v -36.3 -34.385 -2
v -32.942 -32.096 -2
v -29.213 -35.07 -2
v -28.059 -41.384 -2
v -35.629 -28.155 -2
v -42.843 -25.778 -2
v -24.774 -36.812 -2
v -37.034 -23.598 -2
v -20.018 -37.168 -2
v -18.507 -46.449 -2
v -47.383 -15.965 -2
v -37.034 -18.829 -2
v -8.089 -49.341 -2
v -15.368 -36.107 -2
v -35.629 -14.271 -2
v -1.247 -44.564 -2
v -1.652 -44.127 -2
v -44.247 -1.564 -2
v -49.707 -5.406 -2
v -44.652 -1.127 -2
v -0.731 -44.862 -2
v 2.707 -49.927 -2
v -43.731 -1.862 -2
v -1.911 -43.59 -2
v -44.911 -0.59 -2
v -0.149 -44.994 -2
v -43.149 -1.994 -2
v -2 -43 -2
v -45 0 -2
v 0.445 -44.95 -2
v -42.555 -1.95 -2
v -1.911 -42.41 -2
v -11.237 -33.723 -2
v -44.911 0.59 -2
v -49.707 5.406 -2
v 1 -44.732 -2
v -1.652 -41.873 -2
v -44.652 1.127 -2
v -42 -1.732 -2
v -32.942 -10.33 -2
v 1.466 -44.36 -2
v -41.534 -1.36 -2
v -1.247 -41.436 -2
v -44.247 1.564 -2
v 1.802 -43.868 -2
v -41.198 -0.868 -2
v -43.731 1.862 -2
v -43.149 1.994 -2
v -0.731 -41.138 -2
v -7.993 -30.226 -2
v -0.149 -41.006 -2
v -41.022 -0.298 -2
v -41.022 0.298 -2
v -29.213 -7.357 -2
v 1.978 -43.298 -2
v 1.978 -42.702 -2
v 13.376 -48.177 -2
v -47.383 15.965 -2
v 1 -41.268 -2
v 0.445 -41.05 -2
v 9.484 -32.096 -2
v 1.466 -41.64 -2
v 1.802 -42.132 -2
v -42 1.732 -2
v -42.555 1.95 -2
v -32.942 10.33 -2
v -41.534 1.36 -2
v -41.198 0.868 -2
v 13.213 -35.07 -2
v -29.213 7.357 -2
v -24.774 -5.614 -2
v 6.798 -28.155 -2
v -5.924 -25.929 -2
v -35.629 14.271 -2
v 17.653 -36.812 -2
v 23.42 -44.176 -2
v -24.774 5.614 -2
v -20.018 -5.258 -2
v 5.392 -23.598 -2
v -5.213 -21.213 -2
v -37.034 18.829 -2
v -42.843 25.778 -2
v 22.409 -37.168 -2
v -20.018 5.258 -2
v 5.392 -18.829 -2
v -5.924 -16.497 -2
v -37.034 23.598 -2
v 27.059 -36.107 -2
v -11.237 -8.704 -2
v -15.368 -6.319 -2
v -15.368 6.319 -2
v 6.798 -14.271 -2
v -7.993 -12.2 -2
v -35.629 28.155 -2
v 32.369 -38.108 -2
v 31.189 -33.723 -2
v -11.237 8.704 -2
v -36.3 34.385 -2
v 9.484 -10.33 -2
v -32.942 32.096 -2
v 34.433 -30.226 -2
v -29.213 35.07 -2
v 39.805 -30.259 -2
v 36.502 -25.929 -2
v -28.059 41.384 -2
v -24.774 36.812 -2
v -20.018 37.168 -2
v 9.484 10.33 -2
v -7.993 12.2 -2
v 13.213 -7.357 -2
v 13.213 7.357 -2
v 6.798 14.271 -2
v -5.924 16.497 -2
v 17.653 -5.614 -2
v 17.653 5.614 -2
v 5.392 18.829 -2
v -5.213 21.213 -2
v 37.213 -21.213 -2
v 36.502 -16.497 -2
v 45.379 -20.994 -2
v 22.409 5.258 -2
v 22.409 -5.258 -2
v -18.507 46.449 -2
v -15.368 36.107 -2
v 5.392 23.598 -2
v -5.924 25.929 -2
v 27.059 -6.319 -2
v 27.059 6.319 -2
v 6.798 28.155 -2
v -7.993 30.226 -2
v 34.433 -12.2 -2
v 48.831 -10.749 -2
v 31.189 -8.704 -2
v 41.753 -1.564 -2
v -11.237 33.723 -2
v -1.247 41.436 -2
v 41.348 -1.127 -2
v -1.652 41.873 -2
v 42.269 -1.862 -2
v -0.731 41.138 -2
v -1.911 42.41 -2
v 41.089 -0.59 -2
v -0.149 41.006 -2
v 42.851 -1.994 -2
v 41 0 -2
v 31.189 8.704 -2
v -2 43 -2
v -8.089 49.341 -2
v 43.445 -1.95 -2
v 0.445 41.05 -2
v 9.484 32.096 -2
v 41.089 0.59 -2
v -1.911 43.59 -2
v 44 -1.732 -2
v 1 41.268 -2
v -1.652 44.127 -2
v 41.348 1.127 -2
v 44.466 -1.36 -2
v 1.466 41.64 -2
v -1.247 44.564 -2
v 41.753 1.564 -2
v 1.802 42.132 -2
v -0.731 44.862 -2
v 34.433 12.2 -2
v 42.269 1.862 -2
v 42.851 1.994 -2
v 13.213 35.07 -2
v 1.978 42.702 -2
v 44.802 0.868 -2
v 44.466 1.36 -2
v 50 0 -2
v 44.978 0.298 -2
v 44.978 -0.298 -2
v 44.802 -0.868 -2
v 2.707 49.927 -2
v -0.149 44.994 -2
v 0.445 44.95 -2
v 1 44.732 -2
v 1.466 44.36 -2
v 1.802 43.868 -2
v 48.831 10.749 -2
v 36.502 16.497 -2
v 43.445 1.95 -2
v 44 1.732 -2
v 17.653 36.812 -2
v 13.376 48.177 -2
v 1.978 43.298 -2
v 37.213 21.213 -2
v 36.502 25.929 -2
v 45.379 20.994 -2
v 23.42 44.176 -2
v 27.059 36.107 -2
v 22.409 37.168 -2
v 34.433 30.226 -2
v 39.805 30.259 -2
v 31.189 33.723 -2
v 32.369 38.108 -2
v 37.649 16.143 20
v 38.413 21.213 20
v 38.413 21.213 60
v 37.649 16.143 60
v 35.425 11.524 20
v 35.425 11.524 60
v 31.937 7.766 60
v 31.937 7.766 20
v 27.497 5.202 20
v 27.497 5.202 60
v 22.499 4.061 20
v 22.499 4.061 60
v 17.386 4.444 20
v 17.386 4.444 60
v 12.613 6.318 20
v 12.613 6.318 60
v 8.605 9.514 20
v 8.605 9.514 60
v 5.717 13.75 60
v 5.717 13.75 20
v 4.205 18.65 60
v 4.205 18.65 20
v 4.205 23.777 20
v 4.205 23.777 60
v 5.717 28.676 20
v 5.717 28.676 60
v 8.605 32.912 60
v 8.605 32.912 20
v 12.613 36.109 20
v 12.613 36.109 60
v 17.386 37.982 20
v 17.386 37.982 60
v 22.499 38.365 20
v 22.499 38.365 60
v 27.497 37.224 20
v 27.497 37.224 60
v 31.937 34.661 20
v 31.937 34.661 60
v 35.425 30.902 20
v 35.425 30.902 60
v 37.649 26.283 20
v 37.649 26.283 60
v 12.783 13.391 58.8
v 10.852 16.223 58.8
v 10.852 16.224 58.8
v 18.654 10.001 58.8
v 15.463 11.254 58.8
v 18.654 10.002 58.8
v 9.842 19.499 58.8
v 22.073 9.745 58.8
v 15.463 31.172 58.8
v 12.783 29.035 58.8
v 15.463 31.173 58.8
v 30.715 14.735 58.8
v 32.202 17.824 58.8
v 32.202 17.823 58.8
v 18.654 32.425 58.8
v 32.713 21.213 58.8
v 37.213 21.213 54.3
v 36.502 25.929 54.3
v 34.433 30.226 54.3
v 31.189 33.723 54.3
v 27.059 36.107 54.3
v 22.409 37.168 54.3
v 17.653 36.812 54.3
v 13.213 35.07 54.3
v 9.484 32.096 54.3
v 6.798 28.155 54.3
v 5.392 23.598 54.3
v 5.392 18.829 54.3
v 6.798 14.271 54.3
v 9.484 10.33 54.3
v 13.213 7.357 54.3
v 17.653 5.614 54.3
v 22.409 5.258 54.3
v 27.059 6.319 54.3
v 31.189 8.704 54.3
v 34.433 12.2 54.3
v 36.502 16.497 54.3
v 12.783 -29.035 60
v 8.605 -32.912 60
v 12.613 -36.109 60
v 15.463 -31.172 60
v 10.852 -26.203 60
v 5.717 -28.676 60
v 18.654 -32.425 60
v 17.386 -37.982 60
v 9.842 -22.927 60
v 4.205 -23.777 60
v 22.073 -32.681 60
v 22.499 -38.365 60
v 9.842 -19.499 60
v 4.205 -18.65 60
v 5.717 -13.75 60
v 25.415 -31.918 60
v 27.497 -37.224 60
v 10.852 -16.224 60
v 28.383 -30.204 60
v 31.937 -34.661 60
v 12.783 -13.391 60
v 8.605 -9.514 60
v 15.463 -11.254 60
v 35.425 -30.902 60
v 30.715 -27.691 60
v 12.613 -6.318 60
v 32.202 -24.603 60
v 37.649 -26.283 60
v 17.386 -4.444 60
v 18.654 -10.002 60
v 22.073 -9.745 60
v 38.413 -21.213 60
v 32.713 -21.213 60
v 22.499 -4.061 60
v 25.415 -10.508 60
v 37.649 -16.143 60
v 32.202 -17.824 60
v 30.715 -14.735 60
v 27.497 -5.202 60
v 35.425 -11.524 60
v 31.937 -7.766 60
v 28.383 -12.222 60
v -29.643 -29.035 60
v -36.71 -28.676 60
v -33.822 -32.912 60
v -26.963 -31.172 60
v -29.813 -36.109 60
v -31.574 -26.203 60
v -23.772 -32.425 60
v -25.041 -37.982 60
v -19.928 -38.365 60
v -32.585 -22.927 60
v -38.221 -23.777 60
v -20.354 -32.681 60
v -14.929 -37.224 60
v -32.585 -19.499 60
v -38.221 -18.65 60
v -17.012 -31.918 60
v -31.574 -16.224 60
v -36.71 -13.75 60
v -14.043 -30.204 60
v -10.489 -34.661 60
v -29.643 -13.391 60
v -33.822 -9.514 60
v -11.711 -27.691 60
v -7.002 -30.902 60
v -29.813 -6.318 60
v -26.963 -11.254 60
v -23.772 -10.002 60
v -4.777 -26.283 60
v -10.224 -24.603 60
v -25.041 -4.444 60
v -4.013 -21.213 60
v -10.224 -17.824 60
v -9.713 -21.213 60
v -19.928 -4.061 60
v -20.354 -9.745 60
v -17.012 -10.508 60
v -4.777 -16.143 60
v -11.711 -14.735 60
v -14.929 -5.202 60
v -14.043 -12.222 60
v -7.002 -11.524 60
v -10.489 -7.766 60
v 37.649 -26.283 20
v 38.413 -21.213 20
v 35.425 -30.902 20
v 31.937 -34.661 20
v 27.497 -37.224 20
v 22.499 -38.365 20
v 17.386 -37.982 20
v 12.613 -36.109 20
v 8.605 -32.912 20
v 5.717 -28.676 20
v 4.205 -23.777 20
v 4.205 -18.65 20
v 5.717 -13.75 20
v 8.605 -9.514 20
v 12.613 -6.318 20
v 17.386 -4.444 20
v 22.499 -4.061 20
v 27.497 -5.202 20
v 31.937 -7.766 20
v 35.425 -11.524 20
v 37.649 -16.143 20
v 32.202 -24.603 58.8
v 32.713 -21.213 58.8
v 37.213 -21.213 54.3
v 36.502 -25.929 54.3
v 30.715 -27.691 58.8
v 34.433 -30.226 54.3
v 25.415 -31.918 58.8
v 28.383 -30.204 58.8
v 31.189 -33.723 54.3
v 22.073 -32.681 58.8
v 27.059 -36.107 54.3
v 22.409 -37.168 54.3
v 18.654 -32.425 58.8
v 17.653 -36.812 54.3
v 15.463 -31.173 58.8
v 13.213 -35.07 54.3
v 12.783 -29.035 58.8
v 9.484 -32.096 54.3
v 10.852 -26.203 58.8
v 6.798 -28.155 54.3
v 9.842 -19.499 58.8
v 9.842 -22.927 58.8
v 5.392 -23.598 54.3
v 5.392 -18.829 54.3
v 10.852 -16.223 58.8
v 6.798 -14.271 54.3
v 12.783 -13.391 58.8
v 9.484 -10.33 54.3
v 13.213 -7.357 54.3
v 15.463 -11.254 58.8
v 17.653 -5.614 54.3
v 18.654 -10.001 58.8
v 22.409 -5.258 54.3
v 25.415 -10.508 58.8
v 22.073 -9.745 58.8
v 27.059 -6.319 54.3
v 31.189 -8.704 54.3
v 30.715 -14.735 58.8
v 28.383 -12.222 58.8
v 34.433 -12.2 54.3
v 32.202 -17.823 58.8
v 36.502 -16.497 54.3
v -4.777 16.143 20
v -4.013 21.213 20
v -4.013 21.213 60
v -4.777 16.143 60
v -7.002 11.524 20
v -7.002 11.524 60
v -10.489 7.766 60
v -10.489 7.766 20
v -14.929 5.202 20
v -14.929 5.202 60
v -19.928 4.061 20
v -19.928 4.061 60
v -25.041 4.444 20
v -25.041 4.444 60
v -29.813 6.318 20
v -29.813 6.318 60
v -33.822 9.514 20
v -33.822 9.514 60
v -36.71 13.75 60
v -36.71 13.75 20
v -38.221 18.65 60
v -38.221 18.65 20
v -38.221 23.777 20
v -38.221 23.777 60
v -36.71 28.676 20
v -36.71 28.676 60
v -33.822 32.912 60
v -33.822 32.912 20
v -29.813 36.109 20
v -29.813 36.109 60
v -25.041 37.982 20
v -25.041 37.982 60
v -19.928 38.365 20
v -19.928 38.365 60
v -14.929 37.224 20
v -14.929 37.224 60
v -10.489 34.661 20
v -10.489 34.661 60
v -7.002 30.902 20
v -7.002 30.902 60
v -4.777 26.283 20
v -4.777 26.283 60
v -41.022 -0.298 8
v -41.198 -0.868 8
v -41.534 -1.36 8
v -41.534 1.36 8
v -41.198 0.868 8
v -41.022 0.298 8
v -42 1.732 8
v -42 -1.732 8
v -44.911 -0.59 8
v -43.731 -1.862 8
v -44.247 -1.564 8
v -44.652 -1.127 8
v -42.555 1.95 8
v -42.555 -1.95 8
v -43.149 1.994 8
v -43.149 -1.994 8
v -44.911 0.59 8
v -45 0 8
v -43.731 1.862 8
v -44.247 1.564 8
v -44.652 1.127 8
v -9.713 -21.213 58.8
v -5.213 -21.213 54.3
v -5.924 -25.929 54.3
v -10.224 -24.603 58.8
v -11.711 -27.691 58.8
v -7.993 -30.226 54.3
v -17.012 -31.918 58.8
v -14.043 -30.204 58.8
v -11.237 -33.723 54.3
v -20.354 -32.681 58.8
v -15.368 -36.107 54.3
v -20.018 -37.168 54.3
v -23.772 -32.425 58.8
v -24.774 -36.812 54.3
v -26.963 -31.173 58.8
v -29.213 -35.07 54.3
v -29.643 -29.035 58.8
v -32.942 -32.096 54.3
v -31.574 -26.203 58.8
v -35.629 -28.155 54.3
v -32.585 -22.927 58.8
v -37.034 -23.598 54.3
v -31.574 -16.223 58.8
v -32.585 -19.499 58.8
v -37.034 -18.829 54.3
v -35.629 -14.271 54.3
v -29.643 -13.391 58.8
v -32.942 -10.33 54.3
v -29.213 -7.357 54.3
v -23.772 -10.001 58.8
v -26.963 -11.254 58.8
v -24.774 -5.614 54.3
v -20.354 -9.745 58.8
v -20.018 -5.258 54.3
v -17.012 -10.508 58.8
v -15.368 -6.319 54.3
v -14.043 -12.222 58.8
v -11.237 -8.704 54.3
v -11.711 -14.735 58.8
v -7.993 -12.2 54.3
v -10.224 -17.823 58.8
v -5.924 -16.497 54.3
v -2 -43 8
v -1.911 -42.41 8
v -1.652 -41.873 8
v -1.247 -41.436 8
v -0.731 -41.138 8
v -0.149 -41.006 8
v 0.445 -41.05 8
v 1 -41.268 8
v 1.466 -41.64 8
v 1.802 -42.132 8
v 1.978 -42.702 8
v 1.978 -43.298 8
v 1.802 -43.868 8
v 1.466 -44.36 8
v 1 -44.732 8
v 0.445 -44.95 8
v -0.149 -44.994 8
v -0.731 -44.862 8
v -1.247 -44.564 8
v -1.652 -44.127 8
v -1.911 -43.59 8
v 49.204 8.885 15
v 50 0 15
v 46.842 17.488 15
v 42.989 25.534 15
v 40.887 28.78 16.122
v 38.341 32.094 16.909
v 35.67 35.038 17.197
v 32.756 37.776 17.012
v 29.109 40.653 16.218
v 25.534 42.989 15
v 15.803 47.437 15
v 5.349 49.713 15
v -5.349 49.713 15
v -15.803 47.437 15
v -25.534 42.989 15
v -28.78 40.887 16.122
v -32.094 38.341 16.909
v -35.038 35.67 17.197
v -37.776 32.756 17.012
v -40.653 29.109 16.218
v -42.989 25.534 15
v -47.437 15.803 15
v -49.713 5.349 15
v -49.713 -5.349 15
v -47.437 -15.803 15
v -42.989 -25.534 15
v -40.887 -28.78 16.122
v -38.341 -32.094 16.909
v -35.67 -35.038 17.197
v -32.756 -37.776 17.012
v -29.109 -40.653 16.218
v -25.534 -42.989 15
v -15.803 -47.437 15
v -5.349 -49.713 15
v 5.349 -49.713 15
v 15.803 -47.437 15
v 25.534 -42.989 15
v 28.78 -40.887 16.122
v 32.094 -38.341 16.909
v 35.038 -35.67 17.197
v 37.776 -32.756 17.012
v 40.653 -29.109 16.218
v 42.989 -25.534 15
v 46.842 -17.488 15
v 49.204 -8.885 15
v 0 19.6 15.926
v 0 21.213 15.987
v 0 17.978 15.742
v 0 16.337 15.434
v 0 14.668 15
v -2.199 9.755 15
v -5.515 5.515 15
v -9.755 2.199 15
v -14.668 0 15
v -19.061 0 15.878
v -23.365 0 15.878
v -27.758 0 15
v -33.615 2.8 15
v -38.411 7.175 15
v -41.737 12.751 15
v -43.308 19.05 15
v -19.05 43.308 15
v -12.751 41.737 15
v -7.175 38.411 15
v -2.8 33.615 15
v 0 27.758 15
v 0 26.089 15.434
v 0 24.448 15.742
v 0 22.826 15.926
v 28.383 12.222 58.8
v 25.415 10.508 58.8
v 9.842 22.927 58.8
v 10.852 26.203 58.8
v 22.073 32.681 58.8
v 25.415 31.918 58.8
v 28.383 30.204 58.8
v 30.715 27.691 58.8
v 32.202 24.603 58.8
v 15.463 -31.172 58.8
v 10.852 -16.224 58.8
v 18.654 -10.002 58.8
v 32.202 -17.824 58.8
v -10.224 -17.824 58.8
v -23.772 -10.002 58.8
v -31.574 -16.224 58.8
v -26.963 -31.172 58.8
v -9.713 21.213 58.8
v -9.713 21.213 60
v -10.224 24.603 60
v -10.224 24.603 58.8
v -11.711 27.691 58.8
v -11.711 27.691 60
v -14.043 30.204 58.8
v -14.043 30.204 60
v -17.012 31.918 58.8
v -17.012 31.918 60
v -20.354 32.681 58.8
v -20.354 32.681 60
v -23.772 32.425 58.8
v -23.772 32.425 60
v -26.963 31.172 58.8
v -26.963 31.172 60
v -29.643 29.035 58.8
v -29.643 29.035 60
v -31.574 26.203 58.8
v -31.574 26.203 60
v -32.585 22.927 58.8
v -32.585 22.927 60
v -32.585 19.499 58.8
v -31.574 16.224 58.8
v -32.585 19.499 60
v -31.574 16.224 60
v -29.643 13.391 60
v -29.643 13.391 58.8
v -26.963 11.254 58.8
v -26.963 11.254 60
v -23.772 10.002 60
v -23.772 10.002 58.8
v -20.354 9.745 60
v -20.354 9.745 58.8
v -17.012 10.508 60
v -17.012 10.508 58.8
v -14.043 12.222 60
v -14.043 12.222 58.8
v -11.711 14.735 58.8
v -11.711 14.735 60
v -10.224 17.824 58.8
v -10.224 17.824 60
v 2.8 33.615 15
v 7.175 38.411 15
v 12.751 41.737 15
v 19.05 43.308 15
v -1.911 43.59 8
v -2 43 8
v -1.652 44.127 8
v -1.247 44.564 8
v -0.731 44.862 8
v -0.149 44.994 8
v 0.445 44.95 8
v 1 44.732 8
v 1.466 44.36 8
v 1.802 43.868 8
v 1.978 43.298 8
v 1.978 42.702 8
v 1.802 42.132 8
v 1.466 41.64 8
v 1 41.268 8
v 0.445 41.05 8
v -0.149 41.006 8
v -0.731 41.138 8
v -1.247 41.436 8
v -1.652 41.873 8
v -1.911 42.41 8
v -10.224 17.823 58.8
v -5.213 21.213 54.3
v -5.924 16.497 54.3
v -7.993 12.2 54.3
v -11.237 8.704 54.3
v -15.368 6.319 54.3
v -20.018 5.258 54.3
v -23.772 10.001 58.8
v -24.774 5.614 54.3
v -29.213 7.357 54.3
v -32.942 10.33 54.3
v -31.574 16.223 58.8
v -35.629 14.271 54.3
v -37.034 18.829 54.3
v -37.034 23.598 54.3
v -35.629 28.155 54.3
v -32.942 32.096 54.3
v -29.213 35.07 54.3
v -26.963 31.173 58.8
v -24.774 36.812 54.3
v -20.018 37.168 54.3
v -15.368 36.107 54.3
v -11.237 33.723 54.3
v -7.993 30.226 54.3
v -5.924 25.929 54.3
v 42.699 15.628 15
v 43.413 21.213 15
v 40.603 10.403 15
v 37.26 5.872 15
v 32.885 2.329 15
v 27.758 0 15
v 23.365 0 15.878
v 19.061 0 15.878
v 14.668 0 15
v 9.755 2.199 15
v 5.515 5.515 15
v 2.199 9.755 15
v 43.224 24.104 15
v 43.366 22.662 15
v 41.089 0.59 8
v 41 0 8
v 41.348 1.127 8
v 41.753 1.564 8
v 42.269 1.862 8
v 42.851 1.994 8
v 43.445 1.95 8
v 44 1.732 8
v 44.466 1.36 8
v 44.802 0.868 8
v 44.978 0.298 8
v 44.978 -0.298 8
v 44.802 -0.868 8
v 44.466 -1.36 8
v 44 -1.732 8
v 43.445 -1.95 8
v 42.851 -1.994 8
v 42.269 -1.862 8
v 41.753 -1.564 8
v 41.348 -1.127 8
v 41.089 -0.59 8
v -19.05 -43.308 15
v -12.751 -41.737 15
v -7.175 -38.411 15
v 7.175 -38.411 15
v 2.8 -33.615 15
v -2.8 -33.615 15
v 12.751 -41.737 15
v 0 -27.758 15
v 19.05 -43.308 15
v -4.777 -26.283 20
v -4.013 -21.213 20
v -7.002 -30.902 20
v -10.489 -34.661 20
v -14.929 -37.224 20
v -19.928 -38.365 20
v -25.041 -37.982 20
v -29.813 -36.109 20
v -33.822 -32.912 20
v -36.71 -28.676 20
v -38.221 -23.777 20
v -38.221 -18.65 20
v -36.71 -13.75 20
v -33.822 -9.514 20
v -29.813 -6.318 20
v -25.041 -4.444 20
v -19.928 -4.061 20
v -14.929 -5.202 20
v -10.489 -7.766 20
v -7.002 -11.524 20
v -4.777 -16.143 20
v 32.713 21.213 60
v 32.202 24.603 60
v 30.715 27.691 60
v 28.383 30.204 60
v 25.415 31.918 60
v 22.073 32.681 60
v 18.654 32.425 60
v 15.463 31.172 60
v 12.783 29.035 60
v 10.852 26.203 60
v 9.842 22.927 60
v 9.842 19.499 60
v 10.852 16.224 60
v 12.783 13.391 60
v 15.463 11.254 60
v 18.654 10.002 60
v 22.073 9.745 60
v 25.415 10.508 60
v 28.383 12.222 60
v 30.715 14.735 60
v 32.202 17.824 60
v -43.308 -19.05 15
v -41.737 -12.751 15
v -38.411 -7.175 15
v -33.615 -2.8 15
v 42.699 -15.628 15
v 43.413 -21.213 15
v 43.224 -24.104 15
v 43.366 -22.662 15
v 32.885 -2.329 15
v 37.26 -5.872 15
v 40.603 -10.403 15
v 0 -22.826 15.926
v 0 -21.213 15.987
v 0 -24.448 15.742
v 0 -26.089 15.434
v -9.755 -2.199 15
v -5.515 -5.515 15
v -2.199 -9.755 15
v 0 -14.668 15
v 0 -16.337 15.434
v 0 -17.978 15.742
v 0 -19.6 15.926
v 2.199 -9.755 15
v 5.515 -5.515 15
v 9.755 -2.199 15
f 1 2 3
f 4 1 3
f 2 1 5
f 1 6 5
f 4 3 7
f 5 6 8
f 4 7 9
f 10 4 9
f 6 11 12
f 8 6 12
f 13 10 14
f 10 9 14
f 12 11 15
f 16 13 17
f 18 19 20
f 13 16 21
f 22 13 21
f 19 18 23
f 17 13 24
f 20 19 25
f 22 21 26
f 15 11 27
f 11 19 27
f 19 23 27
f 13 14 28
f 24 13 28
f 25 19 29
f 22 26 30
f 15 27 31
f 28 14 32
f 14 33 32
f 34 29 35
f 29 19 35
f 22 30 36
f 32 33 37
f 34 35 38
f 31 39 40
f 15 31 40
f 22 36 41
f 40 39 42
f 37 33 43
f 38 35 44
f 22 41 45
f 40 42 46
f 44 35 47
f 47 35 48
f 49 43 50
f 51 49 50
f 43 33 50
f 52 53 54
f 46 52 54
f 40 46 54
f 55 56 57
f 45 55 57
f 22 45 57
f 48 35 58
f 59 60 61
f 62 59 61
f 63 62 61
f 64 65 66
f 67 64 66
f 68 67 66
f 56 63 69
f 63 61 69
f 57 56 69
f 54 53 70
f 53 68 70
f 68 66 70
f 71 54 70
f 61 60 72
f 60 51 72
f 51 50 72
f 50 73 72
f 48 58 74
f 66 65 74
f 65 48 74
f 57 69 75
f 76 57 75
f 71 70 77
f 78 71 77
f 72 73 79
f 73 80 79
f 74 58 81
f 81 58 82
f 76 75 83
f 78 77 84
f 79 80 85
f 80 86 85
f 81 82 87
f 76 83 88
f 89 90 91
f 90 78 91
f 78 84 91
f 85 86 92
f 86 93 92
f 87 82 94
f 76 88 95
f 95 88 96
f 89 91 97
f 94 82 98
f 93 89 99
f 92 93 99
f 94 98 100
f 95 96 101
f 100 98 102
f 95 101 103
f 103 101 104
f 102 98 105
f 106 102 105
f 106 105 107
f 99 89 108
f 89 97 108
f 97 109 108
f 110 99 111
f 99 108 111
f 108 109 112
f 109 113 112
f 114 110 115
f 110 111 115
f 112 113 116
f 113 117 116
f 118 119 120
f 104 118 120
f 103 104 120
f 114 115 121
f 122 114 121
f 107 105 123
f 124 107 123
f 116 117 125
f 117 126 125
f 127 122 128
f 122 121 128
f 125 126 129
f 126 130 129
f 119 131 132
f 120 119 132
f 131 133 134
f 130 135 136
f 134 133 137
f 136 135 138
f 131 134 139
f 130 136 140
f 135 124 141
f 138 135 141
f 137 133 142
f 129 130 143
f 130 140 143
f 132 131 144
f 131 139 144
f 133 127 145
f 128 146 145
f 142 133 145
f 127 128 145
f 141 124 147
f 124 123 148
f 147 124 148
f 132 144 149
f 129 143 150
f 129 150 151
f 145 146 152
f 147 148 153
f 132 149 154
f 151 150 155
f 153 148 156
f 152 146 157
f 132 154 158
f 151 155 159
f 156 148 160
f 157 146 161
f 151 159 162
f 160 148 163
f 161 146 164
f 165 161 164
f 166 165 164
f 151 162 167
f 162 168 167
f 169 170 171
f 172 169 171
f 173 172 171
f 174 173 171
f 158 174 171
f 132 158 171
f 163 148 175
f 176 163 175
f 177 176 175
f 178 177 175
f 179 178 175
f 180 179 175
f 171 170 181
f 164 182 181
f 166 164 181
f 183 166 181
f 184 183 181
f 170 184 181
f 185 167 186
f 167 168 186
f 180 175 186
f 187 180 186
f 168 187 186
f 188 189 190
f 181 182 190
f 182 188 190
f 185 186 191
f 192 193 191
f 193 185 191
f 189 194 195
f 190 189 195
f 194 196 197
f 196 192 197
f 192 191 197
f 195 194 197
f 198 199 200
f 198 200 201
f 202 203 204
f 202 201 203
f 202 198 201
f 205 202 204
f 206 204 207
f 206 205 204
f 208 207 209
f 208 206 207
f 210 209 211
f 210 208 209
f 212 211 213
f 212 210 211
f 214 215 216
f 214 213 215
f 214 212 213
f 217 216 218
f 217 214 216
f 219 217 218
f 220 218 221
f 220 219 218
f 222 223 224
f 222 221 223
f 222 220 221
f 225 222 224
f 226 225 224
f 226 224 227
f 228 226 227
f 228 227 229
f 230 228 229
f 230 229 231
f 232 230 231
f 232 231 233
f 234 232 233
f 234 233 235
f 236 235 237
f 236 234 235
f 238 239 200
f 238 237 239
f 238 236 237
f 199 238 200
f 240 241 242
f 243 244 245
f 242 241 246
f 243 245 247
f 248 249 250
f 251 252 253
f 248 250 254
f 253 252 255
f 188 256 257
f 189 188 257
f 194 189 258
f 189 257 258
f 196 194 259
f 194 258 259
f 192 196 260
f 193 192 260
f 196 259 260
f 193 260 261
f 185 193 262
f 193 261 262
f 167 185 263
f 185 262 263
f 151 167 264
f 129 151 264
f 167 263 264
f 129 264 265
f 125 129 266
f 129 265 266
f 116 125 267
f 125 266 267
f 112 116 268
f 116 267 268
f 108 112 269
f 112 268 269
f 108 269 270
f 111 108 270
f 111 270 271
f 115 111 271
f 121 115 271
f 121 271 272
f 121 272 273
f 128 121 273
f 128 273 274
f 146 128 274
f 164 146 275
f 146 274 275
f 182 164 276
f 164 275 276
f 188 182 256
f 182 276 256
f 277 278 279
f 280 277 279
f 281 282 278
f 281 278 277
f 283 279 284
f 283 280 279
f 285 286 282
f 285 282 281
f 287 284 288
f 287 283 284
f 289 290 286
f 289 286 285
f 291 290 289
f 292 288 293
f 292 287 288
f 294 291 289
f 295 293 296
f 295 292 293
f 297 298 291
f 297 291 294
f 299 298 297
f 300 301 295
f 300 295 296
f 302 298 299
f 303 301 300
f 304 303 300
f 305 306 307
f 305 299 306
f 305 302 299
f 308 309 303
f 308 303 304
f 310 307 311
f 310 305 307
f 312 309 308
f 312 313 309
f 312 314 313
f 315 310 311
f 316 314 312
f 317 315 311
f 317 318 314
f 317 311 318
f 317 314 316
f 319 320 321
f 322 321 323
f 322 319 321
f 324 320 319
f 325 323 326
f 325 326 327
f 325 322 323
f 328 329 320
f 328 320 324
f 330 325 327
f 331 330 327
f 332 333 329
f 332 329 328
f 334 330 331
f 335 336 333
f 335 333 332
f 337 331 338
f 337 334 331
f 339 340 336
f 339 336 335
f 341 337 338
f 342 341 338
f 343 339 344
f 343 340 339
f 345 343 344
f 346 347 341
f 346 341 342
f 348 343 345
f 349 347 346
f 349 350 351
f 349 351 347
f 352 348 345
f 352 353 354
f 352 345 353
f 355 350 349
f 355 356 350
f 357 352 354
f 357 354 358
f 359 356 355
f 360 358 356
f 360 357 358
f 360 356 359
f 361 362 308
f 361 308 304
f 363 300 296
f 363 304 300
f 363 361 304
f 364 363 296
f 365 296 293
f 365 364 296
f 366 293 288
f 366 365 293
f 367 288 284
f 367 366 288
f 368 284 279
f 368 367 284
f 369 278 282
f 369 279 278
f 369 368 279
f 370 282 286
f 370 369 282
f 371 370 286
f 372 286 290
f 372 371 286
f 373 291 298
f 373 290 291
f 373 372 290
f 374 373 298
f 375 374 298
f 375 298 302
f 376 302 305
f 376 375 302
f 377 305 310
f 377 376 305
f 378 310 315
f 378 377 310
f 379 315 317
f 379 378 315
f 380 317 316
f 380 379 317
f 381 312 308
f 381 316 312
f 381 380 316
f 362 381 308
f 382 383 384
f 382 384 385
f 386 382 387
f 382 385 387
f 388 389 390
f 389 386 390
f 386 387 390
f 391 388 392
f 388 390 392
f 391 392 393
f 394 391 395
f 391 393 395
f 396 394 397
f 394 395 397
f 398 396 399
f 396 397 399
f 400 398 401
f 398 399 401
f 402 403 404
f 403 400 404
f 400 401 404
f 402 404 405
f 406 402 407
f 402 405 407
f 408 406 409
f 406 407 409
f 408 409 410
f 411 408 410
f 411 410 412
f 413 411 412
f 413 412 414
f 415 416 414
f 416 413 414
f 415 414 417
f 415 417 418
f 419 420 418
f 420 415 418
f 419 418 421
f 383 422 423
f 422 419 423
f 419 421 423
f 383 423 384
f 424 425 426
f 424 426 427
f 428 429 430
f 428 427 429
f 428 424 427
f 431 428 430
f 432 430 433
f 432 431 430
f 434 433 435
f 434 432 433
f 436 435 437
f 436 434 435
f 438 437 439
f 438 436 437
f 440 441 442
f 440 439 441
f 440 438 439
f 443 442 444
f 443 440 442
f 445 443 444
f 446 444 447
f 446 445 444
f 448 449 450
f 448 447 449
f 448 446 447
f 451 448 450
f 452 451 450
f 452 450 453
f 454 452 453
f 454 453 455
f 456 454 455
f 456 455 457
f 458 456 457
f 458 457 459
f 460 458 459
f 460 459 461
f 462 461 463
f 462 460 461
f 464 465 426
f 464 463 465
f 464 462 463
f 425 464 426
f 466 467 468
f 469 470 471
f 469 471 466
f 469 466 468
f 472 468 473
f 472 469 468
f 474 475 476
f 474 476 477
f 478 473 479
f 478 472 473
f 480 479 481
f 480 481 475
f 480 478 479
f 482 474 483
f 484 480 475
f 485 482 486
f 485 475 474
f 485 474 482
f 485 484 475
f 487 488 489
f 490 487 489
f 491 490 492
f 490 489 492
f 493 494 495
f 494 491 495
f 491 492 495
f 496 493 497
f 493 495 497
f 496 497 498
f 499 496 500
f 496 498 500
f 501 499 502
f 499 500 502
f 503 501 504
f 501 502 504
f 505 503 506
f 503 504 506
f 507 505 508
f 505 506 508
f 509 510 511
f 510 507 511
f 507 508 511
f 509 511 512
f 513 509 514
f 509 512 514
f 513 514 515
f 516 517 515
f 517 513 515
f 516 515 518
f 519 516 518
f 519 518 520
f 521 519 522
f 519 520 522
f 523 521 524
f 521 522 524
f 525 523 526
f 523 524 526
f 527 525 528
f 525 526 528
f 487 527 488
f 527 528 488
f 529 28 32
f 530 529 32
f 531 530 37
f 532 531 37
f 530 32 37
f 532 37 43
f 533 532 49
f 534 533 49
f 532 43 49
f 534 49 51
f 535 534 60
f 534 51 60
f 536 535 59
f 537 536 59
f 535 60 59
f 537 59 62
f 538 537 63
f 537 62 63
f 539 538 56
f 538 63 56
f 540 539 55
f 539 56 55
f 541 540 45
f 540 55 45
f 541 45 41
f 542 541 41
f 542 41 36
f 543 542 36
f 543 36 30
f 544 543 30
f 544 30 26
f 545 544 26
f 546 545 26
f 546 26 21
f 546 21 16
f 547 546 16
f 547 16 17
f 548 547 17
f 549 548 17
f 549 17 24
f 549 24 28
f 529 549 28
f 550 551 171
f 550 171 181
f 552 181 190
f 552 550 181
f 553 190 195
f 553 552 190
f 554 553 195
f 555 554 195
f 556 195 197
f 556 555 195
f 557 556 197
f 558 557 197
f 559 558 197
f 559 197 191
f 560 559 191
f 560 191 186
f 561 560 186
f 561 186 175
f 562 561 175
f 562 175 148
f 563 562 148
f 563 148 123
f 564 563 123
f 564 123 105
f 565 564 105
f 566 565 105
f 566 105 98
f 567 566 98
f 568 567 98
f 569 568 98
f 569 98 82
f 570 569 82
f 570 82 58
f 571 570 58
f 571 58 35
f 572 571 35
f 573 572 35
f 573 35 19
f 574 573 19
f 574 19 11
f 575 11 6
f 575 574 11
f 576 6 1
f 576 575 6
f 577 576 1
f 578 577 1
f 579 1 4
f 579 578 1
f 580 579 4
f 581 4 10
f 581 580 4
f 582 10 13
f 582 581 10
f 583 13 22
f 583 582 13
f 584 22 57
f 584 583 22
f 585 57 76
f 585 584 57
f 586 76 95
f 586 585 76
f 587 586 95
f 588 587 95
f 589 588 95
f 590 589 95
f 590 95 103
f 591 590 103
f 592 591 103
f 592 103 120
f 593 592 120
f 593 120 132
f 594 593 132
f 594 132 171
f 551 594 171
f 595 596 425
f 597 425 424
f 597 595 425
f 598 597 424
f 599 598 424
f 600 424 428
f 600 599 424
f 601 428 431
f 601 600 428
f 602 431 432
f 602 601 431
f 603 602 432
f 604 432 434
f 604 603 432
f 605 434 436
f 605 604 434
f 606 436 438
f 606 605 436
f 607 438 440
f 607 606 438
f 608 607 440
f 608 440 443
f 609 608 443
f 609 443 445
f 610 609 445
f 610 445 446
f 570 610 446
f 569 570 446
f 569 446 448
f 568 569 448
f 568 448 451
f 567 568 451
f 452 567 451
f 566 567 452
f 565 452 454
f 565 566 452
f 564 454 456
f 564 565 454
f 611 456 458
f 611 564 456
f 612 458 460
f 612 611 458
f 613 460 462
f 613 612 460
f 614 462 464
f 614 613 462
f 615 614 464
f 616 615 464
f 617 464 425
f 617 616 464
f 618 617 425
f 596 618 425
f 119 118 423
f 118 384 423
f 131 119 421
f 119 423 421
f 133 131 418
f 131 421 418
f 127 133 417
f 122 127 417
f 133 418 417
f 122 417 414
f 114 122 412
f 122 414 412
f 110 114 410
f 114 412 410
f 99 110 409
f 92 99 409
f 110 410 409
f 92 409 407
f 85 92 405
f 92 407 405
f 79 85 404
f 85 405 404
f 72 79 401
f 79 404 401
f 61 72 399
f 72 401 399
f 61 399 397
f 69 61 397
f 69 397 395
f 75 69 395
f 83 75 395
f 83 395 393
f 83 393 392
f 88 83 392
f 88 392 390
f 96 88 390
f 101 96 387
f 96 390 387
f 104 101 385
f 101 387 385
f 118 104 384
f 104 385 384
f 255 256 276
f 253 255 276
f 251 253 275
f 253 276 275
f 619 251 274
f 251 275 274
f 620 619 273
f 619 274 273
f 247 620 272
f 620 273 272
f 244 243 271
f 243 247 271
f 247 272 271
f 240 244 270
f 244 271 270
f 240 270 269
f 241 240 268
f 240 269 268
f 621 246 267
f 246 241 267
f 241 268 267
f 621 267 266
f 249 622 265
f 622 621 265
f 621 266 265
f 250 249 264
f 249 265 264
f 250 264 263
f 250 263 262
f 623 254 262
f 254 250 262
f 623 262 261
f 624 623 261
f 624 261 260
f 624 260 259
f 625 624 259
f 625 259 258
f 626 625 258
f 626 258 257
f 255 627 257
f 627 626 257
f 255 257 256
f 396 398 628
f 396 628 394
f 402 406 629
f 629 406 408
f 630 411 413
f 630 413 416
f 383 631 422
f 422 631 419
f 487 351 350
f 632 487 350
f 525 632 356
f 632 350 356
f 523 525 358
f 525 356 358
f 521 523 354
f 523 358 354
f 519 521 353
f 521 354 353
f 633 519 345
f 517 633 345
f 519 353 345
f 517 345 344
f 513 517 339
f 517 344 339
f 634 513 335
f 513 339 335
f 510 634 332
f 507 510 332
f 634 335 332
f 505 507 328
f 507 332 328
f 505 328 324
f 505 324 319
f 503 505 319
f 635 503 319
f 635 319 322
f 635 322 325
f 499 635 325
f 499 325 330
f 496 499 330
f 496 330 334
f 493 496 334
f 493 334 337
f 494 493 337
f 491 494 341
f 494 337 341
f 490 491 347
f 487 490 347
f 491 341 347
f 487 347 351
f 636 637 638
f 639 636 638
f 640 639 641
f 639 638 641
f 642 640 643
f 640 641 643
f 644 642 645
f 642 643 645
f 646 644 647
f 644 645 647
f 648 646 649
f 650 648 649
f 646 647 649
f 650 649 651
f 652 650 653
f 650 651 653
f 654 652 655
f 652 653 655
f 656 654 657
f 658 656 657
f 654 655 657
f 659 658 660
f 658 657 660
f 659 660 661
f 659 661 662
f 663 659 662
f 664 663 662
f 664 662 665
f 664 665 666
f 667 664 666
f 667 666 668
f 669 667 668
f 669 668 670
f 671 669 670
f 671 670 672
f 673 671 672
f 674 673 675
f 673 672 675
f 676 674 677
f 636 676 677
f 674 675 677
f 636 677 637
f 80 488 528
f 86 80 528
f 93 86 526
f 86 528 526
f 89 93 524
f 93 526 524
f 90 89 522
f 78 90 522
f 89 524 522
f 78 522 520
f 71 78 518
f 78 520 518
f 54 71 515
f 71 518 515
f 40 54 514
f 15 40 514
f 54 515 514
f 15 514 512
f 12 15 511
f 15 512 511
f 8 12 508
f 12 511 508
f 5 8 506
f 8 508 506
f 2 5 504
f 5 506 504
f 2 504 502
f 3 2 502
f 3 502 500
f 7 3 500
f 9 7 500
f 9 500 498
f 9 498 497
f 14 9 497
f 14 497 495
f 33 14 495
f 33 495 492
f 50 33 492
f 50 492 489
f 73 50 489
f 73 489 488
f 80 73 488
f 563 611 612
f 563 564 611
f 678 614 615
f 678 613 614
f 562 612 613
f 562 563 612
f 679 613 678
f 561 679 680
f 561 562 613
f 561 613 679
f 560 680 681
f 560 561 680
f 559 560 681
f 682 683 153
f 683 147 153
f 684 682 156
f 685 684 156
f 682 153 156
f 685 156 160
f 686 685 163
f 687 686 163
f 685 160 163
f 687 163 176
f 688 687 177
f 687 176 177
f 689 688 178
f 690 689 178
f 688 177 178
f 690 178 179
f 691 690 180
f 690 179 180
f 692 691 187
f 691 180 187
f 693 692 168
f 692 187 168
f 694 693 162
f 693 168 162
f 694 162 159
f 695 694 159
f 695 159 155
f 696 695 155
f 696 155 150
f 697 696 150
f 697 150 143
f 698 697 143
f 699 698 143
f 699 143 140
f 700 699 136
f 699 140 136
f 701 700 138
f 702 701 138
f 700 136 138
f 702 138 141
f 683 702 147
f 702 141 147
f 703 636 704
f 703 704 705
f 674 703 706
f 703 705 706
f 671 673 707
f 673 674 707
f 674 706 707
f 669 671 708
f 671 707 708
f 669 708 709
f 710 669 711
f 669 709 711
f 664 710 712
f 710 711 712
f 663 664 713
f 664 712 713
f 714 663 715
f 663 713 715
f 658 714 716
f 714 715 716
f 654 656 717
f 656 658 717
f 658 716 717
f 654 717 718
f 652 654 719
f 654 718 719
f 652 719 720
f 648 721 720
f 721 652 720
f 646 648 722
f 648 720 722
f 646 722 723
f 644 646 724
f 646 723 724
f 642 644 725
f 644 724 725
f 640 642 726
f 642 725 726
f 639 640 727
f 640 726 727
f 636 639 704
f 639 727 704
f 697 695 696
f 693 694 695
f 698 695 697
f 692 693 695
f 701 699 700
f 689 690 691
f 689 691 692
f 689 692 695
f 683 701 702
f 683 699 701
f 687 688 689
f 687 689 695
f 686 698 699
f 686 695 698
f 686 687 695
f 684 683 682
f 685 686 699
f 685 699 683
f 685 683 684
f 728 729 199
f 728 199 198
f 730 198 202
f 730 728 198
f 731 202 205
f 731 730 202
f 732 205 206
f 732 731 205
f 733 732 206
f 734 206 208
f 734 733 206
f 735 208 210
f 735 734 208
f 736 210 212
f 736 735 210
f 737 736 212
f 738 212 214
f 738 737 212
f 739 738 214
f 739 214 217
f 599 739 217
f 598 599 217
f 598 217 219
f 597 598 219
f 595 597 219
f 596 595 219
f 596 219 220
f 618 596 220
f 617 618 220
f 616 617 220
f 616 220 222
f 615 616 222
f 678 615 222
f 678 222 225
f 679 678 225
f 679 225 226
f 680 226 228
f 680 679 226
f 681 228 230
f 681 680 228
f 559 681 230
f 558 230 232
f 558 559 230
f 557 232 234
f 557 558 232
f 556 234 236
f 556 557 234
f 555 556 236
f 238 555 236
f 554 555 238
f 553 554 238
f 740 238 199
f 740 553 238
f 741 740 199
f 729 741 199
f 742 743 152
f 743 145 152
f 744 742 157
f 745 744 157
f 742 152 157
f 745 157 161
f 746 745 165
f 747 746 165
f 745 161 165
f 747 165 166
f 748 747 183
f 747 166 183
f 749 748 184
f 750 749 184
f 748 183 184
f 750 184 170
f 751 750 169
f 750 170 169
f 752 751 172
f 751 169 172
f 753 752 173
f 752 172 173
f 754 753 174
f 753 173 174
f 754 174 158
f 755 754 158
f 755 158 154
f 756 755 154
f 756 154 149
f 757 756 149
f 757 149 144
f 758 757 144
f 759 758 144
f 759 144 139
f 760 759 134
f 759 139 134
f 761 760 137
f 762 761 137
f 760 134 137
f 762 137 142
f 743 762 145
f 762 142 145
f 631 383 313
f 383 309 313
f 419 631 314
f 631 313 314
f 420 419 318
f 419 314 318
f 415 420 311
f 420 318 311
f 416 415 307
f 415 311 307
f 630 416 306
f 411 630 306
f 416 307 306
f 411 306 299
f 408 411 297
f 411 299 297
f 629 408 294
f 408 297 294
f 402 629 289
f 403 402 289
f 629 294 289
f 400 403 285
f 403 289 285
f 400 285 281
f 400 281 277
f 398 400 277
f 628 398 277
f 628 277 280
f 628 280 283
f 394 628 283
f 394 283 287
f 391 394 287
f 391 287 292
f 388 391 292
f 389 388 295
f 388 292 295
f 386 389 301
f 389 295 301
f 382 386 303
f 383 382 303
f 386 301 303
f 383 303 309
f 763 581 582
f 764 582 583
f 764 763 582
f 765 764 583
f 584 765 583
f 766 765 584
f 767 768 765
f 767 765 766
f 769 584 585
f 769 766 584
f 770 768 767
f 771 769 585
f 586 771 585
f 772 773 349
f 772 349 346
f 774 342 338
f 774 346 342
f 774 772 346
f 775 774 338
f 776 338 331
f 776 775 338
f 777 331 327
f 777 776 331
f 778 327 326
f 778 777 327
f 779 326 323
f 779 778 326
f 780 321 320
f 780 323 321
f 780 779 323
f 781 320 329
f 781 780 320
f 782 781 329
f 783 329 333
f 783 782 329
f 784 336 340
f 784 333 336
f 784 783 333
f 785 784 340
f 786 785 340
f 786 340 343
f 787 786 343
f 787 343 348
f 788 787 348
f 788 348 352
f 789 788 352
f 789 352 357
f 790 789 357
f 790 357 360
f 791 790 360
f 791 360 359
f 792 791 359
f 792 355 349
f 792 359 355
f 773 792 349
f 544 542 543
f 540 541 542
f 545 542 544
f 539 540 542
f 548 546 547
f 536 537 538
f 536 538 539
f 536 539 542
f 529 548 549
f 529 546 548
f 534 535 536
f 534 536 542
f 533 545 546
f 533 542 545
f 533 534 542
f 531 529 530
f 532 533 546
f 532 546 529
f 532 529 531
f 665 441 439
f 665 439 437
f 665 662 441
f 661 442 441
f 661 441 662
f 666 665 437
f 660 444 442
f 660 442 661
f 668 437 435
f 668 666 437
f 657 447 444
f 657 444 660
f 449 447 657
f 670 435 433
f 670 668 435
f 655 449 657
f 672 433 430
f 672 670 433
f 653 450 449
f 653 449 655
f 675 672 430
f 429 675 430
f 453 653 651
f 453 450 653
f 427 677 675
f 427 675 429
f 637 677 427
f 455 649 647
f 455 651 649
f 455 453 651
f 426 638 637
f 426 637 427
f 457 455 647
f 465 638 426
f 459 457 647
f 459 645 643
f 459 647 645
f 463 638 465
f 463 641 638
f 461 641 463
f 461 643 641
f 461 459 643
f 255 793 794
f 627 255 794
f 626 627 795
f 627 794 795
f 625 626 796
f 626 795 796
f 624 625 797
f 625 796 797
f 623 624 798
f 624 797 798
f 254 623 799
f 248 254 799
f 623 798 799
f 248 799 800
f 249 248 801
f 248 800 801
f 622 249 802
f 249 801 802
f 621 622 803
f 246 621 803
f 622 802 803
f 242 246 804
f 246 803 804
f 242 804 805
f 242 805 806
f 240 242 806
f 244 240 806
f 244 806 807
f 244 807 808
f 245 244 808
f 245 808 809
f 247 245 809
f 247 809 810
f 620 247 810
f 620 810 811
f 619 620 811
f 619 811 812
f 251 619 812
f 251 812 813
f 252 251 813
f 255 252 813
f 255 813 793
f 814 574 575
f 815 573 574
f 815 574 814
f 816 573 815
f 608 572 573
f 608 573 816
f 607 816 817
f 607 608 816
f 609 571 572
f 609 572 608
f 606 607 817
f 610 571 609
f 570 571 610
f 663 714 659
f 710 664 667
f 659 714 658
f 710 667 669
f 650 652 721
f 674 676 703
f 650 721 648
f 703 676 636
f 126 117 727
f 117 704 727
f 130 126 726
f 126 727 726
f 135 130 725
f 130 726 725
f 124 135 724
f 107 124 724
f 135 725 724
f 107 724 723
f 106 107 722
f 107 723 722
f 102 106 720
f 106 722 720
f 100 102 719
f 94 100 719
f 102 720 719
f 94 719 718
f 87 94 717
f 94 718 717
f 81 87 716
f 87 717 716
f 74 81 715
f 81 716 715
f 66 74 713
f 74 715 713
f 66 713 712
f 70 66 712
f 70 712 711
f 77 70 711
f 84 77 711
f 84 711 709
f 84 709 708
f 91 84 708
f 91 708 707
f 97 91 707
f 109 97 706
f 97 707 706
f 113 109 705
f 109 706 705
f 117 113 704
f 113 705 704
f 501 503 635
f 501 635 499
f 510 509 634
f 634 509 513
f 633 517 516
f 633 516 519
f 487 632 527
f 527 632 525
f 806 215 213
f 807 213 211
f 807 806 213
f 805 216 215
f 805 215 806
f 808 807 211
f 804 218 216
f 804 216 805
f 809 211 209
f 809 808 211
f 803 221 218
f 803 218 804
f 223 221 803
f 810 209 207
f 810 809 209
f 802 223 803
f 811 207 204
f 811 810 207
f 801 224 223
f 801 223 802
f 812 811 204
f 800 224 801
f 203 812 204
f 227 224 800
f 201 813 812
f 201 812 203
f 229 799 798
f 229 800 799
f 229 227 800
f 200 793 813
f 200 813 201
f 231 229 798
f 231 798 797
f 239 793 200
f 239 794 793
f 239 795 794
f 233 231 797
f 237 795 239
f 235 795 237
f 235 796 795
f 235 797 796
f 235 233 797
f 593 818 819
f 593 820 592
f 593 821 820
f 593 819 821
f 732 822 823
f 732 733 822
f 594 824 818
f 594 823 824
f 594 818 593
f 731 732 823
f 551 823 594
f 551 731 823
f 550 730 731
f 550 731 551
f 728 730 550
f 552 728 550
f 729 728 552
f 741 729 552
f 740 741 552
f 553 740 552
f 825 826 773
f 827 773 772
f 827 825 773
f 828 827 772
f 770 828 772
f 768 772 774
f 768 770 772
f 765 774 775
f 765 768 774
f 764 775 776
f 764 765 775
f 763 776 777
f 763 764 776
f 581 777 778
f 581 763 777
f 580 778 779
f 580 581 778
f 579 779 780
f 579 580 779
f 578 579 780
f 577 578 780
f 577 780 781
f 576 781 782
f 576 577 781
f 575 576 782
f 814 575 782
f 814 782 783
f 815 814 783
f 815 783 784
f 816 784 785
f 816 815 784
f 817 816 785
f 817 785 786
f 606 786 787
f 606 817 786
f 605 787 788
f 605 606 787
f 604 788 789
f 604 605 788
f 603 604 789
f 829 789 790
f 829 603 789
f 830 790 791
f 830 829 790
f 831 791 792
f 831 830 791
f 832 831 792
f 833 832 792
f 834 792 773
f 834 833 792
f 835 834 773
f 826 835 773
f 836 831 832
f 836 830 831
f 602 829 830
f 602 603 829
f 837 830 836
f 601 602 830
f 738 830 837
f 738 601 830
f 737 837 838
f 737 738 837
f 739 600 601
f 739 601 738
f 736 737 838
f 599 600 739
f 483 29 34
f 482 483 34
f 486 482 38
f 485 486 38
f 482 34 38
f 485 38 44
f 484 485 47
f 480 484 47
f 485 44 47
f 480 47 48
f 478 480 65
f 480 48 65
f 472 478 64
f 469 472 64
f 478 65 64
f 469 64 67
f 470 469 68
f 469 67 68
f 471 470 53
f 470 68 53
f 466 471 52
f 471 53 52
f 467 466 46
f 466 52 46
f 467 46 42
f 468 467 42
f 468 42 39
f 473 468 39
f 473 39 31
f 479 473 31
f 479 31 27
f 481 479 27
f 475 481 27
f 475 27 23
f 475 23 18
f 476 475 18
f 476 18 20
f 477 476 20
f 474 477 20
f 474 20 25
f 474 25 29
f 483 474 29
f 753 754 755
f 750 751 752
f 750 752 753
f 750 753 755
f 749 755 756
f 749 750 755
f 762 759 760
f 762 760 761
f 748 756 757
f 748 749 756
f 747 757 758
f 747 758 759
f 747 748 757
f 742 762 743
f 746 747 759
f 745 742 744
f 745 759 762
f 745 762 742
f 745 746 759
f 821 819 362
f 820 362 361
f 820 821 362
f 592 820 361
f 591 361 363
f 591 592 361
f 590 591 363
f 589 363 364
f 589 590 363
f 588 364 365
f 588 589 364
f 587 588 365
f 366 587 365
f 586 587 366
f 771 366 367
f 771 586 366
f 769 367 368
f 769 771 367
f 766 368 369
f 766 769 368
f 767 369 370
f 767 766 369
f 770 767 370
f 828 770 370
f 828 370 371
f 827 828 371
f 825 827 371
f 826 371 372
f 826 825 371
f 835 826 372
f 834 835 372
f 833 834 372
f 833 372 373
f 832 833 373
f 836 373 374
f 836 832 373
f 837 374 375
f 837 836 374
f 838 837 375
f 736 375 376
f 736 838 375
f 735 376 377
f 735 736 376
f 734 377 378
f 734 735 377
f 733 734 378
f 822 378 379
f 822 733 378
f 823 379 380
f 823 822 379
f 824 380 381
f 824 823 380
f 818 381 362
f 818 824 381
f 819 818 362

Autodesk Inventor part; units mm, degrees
ref_plane "YZ Plane" through (0, 0, 0) normal (1, 0, 0) x (0, 1, 0)
ref_plane "XZ Plane" through (0, 0, 0) normal (0, 1, 0) x (-1, 0, 0)
ref_plane "XY Plane" through (0, 0, 0) normal (0, 0, 1) x (1, 0, 0)
sketch "Sketch1" plane through (0, 0, 0) normal (0, 0, 1) x (1, 0, 0)
  circle A0 centre (0, 0) radius 50
  circle A1 centre (21.2132, 21.2132) radius 16
  circle A2 centre (21.2132, 21.2132) radius 17.2
  line L0 (0, 0) -> (50, 0) construction
  line L1 (0, 0) -> (35.3553, 35.3553) construction
  circle A3 centre (-21.2132, 21.2132) radius 16
  circle A4 centre (-21.2132, 21.2132) radius 17.2
  circle A5 centre (-21.2132, -21.2132) radius 16
  circle A6 centre (-21.2132, -21.2132) radius 17.2
  circle A7 centre (21.2132, -21.2132) radius 16
  circle A8 centre (21.2132, -21.2132) radius 17.2
  dimension "d0" = 32
  dimension "d2" = 100
  dimension "d3" = 1.2
  dimension "d5" = 45
  dimension "d6" = 30
  dimension "d9" = 360
extrude "Extrusion1" add sketch "Sketch1" against normal blind 2 contours A0 | A2 | A4 | A6 | A8
extrude "Extrusion2" add sketch "Sketch1" along normal blind 60 contours A2 | A4 | A6 | A8
sketch "Sketch2" plane through (21.2132, 21.2132, 60) normal (0, 0, 1) x (1, 0, 0)
  circle A0 centre (-42.4264, 0) radius 16 projected
  circle A1 centre (0, 0) radius 16 projected
  circle A2 centre (0, -42.4264) radius 16 projected
  circle A3 centre (-42.4264, -42.4264) radius 16 projected
  circle A4 centre (0, 0) radius 11.5
  circle A5 centre (-42.4264, 0) radius 11.5
  circle A6 centre (-42.4264, -42.4264) radius 11.5
  circle A7 centre (0, -42.4264) radius 11.5
  point P0 (-21.2132, -21.2132)
  dimension "d15" = 23
extrude "Extrusion3" add sketch "Sketch2" against normal blind 1.2
chamfer "Chamfer1" distance 4.5 angle 45 4 edges at (5.2132, 21.2132, 58.8) (-37.2132, 21.2132, 58.8) (-37.2132, -21.2132, 58.8) (5.2132, -21.2132, 58.8)
sketch "Sketch4" plane through (0, 0, 0) normal (0, 0, 1) x (1, 0, 0)
  circle A0 centre (21.2132, 21.2132) radius 17.2 projected
  circle A1 centre (-21.2132, -21.2132) radius 17.2 projected
  circle A2 centre (21.2132, -21.2132) radius 17.2 projected
  circle A3 centre (-21.2132, 21.2132) radius 17.2 projected
  circle A4 centre (0, 0) radius 50 projected
  circle A5 centre (0, -43) radius 2 projected
extrude "Extrusion5" add sketch "Sketch4" along normal blind 15 contours A4 | A5
chamfer "Chamfer3" distance 5 angle 45 4 edges at (-38.4132, 21.2132, 15) (4.0132, 21.2132, 15) (4.0132, -21.2132, 15) (-38.4132, -21.2132, 15)
sketch "Sketch5" plane through (0, 0, -2) normal (0, 0, -1) x (-1, 0, 0)
  circle A0 centre (0, 43) radius 2
  circle A1 centre (-43, 0) radius 2
  circle A2 centre (0, -43) radius 2
  circle A3 centre (43, 0) radius 2
  point P0 (0, 0)
  dimension "d39" = 4
  dimension "d40" = 43
  dimension "d43" = 360
extrude "Extrusion6" cut sketch "Sketch5" against normal blind 10
properties part number "Cam Barrel Plate" material "ABS Plastic"
